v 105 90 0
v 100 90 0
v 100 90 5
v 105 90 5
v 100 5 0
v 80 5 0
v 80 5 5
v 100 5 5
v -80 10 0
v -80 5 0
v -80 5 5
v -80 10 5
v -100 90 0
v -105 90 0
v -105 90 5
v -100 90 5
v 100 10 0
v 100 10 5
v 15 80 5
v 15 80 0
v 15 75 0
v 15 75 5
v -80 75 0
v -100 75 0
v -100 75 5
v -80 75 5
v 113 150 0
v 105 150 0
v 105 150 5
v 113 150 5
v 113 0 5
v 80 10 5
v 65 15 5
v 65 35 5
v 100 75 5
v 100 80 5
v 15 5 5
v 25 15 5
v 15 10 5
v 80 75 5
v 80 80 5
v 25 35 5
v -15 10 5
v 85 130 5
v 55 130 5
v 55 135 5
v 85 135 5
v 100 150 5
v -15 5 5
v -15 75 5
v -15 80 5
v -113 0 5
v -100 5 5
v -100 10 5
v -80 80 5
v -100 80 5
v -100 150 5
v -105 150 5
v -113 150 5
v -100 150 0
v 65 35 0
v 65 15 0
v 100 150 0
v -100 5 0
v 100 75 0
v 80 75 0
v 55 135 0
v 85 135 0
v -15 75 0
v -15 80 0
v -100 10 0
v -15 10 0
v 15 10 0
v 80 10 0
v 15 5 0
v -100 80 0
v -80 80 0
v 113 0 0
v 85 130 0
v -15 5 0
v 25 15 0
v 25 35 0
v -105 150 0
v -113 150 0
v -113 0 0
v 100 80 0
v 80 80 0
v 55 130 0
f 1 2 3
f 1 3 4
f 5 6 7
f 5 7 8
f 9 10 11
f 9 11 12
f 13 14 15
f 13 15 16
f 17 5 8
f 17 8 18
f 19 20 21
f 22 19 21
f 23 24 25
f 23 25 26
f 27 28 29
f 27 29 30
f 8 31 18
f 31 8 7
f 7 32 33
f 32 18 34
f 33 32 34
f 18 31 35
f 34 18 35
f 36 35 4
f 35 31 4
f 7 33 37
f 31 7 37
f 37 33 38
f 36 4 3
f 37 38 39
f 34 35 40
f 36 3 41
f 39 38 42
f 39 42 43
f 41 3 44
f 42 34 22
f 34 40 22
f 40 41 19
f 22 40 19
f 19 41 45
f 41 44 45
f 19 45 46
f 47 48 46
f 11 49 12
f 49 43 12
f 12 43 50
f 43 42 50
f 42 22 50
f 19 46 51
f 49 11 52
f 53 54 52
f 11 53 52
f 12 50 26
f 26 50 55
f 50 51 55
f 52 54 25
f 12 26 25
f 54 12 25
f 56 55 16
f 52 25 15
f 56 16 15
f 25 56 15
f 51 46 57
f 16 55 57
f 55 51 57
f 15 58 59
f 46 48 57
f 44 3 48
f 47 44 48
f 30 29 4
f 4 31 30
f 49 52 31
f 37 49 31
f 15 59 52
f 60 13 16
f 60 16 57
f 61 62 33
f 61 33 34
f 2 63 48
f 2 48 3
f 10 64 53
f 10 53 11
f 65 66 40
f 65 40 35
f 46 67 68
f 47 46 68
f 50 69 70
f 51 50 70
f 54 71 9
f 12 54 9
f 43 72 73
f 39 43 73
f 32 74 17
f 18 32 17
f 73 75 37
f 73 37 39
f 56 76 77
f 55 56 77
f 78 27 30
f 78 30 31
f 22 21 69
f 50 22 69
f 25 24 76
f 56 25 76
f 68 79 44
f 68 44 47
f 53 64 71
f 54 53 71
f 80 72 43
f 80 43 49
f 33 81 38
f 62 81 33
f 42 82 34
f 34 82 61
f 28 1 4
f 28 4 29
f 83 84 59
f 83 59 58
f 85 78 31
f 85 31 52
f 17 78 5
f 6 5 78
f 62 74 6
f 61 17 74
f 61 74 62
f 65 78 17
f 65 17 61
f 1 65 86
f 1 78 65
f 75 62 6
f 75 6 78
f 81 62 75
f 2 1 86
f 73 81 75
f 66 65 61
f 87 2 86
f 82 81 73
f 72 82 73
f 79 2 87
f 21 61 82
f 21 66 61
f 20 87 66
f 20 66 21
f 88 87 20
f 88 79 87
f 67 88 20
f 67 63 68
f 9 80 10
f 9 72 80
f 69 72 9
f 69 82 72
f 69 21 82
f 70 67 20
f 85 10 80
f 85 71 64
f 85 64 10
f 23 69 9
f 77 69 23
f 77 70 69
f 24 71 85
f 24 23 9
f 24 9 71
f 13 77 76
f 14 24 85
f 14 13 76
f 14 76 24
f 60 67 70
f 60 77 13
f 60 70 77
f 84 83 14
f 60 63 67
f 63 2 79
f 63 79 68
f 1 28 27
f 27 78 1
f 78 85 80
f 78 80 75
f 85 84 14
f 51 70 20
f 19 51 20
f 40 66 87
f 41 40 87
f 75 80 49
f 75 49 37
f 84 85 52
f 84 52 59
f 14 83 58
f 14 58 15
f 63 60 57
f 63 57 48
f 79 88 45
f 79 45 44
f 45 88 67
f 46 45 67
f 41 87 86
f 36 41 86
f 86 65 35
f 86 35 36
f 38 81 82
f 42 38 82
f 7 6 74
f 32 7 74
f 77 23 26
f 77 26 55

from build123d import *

# Parameters (mm, degrees)
ESQUISSE1_W        = 20
ESQUISSE1_H        = 5
ESQUISSE1_W_2      = 40
ESQUISSE1_H_2      = 20
ESQUISSE1_W_3      = 30
BOSS_EXTRU_1_DEPTH = 5


with BuildPart() as part:
    # Esquisse1 → Boss.-Extru.1 (new body)
    with BuildSketch(Plane.XY):
        Polygon((-100, 150), (100, 150), (100, 90), (105, 90), (105, 150), (113, 150), (113, 0), (-113, 0), (-113, 150), (-105, 150), (-105, 90), (-100, 90), align=None)
        with Locations((90, 7.5)):
            Rectangle(ESQUISSE1_W, ESQUISSE1_H, mode=Mode.SUBTRACT)
        with Locations((90, 77.5)):
            Rectangle(ESQUISSE1_W, ESQUISSE1_H, mode=Mode.SUBTRACT)
        Polygon((-15, 5), (15, 5), (15, 10), (0, 10), (-15, 10), align=None, mode=Mode.SUBTRACT)
        Polygon((-15, 80), (0, 80), (15, 80), (15, 75), (-15, 75), align=None, mode=Mode.SUBTRACT)
        with Locations((-90, 7.5)):
            Rectangle(ESQUISSE1_W, ESQUISSE1_H, mode=Mode.SUBTRACT)
        with Locations((-90, 77.5)):
            Rectangle(ESQUISSE1_W, ESQUISSE1_H, mode=Mode.SUBTRACT)
        with Locations((45, 25)):
            Rectangle(ESQUISSE1_W_2, ESQUISSE1_H_2, mode=Mode.SUBTRACT)
        with Locations((70, 132.5)):
            Rectangle(ESQUISSE1_W_3, ESQUISSE1_H, mode=Mode.SUBTRACT)
    extrude(amount=BOSS_EXTRU_1_DEPTH)


solid = part.part
